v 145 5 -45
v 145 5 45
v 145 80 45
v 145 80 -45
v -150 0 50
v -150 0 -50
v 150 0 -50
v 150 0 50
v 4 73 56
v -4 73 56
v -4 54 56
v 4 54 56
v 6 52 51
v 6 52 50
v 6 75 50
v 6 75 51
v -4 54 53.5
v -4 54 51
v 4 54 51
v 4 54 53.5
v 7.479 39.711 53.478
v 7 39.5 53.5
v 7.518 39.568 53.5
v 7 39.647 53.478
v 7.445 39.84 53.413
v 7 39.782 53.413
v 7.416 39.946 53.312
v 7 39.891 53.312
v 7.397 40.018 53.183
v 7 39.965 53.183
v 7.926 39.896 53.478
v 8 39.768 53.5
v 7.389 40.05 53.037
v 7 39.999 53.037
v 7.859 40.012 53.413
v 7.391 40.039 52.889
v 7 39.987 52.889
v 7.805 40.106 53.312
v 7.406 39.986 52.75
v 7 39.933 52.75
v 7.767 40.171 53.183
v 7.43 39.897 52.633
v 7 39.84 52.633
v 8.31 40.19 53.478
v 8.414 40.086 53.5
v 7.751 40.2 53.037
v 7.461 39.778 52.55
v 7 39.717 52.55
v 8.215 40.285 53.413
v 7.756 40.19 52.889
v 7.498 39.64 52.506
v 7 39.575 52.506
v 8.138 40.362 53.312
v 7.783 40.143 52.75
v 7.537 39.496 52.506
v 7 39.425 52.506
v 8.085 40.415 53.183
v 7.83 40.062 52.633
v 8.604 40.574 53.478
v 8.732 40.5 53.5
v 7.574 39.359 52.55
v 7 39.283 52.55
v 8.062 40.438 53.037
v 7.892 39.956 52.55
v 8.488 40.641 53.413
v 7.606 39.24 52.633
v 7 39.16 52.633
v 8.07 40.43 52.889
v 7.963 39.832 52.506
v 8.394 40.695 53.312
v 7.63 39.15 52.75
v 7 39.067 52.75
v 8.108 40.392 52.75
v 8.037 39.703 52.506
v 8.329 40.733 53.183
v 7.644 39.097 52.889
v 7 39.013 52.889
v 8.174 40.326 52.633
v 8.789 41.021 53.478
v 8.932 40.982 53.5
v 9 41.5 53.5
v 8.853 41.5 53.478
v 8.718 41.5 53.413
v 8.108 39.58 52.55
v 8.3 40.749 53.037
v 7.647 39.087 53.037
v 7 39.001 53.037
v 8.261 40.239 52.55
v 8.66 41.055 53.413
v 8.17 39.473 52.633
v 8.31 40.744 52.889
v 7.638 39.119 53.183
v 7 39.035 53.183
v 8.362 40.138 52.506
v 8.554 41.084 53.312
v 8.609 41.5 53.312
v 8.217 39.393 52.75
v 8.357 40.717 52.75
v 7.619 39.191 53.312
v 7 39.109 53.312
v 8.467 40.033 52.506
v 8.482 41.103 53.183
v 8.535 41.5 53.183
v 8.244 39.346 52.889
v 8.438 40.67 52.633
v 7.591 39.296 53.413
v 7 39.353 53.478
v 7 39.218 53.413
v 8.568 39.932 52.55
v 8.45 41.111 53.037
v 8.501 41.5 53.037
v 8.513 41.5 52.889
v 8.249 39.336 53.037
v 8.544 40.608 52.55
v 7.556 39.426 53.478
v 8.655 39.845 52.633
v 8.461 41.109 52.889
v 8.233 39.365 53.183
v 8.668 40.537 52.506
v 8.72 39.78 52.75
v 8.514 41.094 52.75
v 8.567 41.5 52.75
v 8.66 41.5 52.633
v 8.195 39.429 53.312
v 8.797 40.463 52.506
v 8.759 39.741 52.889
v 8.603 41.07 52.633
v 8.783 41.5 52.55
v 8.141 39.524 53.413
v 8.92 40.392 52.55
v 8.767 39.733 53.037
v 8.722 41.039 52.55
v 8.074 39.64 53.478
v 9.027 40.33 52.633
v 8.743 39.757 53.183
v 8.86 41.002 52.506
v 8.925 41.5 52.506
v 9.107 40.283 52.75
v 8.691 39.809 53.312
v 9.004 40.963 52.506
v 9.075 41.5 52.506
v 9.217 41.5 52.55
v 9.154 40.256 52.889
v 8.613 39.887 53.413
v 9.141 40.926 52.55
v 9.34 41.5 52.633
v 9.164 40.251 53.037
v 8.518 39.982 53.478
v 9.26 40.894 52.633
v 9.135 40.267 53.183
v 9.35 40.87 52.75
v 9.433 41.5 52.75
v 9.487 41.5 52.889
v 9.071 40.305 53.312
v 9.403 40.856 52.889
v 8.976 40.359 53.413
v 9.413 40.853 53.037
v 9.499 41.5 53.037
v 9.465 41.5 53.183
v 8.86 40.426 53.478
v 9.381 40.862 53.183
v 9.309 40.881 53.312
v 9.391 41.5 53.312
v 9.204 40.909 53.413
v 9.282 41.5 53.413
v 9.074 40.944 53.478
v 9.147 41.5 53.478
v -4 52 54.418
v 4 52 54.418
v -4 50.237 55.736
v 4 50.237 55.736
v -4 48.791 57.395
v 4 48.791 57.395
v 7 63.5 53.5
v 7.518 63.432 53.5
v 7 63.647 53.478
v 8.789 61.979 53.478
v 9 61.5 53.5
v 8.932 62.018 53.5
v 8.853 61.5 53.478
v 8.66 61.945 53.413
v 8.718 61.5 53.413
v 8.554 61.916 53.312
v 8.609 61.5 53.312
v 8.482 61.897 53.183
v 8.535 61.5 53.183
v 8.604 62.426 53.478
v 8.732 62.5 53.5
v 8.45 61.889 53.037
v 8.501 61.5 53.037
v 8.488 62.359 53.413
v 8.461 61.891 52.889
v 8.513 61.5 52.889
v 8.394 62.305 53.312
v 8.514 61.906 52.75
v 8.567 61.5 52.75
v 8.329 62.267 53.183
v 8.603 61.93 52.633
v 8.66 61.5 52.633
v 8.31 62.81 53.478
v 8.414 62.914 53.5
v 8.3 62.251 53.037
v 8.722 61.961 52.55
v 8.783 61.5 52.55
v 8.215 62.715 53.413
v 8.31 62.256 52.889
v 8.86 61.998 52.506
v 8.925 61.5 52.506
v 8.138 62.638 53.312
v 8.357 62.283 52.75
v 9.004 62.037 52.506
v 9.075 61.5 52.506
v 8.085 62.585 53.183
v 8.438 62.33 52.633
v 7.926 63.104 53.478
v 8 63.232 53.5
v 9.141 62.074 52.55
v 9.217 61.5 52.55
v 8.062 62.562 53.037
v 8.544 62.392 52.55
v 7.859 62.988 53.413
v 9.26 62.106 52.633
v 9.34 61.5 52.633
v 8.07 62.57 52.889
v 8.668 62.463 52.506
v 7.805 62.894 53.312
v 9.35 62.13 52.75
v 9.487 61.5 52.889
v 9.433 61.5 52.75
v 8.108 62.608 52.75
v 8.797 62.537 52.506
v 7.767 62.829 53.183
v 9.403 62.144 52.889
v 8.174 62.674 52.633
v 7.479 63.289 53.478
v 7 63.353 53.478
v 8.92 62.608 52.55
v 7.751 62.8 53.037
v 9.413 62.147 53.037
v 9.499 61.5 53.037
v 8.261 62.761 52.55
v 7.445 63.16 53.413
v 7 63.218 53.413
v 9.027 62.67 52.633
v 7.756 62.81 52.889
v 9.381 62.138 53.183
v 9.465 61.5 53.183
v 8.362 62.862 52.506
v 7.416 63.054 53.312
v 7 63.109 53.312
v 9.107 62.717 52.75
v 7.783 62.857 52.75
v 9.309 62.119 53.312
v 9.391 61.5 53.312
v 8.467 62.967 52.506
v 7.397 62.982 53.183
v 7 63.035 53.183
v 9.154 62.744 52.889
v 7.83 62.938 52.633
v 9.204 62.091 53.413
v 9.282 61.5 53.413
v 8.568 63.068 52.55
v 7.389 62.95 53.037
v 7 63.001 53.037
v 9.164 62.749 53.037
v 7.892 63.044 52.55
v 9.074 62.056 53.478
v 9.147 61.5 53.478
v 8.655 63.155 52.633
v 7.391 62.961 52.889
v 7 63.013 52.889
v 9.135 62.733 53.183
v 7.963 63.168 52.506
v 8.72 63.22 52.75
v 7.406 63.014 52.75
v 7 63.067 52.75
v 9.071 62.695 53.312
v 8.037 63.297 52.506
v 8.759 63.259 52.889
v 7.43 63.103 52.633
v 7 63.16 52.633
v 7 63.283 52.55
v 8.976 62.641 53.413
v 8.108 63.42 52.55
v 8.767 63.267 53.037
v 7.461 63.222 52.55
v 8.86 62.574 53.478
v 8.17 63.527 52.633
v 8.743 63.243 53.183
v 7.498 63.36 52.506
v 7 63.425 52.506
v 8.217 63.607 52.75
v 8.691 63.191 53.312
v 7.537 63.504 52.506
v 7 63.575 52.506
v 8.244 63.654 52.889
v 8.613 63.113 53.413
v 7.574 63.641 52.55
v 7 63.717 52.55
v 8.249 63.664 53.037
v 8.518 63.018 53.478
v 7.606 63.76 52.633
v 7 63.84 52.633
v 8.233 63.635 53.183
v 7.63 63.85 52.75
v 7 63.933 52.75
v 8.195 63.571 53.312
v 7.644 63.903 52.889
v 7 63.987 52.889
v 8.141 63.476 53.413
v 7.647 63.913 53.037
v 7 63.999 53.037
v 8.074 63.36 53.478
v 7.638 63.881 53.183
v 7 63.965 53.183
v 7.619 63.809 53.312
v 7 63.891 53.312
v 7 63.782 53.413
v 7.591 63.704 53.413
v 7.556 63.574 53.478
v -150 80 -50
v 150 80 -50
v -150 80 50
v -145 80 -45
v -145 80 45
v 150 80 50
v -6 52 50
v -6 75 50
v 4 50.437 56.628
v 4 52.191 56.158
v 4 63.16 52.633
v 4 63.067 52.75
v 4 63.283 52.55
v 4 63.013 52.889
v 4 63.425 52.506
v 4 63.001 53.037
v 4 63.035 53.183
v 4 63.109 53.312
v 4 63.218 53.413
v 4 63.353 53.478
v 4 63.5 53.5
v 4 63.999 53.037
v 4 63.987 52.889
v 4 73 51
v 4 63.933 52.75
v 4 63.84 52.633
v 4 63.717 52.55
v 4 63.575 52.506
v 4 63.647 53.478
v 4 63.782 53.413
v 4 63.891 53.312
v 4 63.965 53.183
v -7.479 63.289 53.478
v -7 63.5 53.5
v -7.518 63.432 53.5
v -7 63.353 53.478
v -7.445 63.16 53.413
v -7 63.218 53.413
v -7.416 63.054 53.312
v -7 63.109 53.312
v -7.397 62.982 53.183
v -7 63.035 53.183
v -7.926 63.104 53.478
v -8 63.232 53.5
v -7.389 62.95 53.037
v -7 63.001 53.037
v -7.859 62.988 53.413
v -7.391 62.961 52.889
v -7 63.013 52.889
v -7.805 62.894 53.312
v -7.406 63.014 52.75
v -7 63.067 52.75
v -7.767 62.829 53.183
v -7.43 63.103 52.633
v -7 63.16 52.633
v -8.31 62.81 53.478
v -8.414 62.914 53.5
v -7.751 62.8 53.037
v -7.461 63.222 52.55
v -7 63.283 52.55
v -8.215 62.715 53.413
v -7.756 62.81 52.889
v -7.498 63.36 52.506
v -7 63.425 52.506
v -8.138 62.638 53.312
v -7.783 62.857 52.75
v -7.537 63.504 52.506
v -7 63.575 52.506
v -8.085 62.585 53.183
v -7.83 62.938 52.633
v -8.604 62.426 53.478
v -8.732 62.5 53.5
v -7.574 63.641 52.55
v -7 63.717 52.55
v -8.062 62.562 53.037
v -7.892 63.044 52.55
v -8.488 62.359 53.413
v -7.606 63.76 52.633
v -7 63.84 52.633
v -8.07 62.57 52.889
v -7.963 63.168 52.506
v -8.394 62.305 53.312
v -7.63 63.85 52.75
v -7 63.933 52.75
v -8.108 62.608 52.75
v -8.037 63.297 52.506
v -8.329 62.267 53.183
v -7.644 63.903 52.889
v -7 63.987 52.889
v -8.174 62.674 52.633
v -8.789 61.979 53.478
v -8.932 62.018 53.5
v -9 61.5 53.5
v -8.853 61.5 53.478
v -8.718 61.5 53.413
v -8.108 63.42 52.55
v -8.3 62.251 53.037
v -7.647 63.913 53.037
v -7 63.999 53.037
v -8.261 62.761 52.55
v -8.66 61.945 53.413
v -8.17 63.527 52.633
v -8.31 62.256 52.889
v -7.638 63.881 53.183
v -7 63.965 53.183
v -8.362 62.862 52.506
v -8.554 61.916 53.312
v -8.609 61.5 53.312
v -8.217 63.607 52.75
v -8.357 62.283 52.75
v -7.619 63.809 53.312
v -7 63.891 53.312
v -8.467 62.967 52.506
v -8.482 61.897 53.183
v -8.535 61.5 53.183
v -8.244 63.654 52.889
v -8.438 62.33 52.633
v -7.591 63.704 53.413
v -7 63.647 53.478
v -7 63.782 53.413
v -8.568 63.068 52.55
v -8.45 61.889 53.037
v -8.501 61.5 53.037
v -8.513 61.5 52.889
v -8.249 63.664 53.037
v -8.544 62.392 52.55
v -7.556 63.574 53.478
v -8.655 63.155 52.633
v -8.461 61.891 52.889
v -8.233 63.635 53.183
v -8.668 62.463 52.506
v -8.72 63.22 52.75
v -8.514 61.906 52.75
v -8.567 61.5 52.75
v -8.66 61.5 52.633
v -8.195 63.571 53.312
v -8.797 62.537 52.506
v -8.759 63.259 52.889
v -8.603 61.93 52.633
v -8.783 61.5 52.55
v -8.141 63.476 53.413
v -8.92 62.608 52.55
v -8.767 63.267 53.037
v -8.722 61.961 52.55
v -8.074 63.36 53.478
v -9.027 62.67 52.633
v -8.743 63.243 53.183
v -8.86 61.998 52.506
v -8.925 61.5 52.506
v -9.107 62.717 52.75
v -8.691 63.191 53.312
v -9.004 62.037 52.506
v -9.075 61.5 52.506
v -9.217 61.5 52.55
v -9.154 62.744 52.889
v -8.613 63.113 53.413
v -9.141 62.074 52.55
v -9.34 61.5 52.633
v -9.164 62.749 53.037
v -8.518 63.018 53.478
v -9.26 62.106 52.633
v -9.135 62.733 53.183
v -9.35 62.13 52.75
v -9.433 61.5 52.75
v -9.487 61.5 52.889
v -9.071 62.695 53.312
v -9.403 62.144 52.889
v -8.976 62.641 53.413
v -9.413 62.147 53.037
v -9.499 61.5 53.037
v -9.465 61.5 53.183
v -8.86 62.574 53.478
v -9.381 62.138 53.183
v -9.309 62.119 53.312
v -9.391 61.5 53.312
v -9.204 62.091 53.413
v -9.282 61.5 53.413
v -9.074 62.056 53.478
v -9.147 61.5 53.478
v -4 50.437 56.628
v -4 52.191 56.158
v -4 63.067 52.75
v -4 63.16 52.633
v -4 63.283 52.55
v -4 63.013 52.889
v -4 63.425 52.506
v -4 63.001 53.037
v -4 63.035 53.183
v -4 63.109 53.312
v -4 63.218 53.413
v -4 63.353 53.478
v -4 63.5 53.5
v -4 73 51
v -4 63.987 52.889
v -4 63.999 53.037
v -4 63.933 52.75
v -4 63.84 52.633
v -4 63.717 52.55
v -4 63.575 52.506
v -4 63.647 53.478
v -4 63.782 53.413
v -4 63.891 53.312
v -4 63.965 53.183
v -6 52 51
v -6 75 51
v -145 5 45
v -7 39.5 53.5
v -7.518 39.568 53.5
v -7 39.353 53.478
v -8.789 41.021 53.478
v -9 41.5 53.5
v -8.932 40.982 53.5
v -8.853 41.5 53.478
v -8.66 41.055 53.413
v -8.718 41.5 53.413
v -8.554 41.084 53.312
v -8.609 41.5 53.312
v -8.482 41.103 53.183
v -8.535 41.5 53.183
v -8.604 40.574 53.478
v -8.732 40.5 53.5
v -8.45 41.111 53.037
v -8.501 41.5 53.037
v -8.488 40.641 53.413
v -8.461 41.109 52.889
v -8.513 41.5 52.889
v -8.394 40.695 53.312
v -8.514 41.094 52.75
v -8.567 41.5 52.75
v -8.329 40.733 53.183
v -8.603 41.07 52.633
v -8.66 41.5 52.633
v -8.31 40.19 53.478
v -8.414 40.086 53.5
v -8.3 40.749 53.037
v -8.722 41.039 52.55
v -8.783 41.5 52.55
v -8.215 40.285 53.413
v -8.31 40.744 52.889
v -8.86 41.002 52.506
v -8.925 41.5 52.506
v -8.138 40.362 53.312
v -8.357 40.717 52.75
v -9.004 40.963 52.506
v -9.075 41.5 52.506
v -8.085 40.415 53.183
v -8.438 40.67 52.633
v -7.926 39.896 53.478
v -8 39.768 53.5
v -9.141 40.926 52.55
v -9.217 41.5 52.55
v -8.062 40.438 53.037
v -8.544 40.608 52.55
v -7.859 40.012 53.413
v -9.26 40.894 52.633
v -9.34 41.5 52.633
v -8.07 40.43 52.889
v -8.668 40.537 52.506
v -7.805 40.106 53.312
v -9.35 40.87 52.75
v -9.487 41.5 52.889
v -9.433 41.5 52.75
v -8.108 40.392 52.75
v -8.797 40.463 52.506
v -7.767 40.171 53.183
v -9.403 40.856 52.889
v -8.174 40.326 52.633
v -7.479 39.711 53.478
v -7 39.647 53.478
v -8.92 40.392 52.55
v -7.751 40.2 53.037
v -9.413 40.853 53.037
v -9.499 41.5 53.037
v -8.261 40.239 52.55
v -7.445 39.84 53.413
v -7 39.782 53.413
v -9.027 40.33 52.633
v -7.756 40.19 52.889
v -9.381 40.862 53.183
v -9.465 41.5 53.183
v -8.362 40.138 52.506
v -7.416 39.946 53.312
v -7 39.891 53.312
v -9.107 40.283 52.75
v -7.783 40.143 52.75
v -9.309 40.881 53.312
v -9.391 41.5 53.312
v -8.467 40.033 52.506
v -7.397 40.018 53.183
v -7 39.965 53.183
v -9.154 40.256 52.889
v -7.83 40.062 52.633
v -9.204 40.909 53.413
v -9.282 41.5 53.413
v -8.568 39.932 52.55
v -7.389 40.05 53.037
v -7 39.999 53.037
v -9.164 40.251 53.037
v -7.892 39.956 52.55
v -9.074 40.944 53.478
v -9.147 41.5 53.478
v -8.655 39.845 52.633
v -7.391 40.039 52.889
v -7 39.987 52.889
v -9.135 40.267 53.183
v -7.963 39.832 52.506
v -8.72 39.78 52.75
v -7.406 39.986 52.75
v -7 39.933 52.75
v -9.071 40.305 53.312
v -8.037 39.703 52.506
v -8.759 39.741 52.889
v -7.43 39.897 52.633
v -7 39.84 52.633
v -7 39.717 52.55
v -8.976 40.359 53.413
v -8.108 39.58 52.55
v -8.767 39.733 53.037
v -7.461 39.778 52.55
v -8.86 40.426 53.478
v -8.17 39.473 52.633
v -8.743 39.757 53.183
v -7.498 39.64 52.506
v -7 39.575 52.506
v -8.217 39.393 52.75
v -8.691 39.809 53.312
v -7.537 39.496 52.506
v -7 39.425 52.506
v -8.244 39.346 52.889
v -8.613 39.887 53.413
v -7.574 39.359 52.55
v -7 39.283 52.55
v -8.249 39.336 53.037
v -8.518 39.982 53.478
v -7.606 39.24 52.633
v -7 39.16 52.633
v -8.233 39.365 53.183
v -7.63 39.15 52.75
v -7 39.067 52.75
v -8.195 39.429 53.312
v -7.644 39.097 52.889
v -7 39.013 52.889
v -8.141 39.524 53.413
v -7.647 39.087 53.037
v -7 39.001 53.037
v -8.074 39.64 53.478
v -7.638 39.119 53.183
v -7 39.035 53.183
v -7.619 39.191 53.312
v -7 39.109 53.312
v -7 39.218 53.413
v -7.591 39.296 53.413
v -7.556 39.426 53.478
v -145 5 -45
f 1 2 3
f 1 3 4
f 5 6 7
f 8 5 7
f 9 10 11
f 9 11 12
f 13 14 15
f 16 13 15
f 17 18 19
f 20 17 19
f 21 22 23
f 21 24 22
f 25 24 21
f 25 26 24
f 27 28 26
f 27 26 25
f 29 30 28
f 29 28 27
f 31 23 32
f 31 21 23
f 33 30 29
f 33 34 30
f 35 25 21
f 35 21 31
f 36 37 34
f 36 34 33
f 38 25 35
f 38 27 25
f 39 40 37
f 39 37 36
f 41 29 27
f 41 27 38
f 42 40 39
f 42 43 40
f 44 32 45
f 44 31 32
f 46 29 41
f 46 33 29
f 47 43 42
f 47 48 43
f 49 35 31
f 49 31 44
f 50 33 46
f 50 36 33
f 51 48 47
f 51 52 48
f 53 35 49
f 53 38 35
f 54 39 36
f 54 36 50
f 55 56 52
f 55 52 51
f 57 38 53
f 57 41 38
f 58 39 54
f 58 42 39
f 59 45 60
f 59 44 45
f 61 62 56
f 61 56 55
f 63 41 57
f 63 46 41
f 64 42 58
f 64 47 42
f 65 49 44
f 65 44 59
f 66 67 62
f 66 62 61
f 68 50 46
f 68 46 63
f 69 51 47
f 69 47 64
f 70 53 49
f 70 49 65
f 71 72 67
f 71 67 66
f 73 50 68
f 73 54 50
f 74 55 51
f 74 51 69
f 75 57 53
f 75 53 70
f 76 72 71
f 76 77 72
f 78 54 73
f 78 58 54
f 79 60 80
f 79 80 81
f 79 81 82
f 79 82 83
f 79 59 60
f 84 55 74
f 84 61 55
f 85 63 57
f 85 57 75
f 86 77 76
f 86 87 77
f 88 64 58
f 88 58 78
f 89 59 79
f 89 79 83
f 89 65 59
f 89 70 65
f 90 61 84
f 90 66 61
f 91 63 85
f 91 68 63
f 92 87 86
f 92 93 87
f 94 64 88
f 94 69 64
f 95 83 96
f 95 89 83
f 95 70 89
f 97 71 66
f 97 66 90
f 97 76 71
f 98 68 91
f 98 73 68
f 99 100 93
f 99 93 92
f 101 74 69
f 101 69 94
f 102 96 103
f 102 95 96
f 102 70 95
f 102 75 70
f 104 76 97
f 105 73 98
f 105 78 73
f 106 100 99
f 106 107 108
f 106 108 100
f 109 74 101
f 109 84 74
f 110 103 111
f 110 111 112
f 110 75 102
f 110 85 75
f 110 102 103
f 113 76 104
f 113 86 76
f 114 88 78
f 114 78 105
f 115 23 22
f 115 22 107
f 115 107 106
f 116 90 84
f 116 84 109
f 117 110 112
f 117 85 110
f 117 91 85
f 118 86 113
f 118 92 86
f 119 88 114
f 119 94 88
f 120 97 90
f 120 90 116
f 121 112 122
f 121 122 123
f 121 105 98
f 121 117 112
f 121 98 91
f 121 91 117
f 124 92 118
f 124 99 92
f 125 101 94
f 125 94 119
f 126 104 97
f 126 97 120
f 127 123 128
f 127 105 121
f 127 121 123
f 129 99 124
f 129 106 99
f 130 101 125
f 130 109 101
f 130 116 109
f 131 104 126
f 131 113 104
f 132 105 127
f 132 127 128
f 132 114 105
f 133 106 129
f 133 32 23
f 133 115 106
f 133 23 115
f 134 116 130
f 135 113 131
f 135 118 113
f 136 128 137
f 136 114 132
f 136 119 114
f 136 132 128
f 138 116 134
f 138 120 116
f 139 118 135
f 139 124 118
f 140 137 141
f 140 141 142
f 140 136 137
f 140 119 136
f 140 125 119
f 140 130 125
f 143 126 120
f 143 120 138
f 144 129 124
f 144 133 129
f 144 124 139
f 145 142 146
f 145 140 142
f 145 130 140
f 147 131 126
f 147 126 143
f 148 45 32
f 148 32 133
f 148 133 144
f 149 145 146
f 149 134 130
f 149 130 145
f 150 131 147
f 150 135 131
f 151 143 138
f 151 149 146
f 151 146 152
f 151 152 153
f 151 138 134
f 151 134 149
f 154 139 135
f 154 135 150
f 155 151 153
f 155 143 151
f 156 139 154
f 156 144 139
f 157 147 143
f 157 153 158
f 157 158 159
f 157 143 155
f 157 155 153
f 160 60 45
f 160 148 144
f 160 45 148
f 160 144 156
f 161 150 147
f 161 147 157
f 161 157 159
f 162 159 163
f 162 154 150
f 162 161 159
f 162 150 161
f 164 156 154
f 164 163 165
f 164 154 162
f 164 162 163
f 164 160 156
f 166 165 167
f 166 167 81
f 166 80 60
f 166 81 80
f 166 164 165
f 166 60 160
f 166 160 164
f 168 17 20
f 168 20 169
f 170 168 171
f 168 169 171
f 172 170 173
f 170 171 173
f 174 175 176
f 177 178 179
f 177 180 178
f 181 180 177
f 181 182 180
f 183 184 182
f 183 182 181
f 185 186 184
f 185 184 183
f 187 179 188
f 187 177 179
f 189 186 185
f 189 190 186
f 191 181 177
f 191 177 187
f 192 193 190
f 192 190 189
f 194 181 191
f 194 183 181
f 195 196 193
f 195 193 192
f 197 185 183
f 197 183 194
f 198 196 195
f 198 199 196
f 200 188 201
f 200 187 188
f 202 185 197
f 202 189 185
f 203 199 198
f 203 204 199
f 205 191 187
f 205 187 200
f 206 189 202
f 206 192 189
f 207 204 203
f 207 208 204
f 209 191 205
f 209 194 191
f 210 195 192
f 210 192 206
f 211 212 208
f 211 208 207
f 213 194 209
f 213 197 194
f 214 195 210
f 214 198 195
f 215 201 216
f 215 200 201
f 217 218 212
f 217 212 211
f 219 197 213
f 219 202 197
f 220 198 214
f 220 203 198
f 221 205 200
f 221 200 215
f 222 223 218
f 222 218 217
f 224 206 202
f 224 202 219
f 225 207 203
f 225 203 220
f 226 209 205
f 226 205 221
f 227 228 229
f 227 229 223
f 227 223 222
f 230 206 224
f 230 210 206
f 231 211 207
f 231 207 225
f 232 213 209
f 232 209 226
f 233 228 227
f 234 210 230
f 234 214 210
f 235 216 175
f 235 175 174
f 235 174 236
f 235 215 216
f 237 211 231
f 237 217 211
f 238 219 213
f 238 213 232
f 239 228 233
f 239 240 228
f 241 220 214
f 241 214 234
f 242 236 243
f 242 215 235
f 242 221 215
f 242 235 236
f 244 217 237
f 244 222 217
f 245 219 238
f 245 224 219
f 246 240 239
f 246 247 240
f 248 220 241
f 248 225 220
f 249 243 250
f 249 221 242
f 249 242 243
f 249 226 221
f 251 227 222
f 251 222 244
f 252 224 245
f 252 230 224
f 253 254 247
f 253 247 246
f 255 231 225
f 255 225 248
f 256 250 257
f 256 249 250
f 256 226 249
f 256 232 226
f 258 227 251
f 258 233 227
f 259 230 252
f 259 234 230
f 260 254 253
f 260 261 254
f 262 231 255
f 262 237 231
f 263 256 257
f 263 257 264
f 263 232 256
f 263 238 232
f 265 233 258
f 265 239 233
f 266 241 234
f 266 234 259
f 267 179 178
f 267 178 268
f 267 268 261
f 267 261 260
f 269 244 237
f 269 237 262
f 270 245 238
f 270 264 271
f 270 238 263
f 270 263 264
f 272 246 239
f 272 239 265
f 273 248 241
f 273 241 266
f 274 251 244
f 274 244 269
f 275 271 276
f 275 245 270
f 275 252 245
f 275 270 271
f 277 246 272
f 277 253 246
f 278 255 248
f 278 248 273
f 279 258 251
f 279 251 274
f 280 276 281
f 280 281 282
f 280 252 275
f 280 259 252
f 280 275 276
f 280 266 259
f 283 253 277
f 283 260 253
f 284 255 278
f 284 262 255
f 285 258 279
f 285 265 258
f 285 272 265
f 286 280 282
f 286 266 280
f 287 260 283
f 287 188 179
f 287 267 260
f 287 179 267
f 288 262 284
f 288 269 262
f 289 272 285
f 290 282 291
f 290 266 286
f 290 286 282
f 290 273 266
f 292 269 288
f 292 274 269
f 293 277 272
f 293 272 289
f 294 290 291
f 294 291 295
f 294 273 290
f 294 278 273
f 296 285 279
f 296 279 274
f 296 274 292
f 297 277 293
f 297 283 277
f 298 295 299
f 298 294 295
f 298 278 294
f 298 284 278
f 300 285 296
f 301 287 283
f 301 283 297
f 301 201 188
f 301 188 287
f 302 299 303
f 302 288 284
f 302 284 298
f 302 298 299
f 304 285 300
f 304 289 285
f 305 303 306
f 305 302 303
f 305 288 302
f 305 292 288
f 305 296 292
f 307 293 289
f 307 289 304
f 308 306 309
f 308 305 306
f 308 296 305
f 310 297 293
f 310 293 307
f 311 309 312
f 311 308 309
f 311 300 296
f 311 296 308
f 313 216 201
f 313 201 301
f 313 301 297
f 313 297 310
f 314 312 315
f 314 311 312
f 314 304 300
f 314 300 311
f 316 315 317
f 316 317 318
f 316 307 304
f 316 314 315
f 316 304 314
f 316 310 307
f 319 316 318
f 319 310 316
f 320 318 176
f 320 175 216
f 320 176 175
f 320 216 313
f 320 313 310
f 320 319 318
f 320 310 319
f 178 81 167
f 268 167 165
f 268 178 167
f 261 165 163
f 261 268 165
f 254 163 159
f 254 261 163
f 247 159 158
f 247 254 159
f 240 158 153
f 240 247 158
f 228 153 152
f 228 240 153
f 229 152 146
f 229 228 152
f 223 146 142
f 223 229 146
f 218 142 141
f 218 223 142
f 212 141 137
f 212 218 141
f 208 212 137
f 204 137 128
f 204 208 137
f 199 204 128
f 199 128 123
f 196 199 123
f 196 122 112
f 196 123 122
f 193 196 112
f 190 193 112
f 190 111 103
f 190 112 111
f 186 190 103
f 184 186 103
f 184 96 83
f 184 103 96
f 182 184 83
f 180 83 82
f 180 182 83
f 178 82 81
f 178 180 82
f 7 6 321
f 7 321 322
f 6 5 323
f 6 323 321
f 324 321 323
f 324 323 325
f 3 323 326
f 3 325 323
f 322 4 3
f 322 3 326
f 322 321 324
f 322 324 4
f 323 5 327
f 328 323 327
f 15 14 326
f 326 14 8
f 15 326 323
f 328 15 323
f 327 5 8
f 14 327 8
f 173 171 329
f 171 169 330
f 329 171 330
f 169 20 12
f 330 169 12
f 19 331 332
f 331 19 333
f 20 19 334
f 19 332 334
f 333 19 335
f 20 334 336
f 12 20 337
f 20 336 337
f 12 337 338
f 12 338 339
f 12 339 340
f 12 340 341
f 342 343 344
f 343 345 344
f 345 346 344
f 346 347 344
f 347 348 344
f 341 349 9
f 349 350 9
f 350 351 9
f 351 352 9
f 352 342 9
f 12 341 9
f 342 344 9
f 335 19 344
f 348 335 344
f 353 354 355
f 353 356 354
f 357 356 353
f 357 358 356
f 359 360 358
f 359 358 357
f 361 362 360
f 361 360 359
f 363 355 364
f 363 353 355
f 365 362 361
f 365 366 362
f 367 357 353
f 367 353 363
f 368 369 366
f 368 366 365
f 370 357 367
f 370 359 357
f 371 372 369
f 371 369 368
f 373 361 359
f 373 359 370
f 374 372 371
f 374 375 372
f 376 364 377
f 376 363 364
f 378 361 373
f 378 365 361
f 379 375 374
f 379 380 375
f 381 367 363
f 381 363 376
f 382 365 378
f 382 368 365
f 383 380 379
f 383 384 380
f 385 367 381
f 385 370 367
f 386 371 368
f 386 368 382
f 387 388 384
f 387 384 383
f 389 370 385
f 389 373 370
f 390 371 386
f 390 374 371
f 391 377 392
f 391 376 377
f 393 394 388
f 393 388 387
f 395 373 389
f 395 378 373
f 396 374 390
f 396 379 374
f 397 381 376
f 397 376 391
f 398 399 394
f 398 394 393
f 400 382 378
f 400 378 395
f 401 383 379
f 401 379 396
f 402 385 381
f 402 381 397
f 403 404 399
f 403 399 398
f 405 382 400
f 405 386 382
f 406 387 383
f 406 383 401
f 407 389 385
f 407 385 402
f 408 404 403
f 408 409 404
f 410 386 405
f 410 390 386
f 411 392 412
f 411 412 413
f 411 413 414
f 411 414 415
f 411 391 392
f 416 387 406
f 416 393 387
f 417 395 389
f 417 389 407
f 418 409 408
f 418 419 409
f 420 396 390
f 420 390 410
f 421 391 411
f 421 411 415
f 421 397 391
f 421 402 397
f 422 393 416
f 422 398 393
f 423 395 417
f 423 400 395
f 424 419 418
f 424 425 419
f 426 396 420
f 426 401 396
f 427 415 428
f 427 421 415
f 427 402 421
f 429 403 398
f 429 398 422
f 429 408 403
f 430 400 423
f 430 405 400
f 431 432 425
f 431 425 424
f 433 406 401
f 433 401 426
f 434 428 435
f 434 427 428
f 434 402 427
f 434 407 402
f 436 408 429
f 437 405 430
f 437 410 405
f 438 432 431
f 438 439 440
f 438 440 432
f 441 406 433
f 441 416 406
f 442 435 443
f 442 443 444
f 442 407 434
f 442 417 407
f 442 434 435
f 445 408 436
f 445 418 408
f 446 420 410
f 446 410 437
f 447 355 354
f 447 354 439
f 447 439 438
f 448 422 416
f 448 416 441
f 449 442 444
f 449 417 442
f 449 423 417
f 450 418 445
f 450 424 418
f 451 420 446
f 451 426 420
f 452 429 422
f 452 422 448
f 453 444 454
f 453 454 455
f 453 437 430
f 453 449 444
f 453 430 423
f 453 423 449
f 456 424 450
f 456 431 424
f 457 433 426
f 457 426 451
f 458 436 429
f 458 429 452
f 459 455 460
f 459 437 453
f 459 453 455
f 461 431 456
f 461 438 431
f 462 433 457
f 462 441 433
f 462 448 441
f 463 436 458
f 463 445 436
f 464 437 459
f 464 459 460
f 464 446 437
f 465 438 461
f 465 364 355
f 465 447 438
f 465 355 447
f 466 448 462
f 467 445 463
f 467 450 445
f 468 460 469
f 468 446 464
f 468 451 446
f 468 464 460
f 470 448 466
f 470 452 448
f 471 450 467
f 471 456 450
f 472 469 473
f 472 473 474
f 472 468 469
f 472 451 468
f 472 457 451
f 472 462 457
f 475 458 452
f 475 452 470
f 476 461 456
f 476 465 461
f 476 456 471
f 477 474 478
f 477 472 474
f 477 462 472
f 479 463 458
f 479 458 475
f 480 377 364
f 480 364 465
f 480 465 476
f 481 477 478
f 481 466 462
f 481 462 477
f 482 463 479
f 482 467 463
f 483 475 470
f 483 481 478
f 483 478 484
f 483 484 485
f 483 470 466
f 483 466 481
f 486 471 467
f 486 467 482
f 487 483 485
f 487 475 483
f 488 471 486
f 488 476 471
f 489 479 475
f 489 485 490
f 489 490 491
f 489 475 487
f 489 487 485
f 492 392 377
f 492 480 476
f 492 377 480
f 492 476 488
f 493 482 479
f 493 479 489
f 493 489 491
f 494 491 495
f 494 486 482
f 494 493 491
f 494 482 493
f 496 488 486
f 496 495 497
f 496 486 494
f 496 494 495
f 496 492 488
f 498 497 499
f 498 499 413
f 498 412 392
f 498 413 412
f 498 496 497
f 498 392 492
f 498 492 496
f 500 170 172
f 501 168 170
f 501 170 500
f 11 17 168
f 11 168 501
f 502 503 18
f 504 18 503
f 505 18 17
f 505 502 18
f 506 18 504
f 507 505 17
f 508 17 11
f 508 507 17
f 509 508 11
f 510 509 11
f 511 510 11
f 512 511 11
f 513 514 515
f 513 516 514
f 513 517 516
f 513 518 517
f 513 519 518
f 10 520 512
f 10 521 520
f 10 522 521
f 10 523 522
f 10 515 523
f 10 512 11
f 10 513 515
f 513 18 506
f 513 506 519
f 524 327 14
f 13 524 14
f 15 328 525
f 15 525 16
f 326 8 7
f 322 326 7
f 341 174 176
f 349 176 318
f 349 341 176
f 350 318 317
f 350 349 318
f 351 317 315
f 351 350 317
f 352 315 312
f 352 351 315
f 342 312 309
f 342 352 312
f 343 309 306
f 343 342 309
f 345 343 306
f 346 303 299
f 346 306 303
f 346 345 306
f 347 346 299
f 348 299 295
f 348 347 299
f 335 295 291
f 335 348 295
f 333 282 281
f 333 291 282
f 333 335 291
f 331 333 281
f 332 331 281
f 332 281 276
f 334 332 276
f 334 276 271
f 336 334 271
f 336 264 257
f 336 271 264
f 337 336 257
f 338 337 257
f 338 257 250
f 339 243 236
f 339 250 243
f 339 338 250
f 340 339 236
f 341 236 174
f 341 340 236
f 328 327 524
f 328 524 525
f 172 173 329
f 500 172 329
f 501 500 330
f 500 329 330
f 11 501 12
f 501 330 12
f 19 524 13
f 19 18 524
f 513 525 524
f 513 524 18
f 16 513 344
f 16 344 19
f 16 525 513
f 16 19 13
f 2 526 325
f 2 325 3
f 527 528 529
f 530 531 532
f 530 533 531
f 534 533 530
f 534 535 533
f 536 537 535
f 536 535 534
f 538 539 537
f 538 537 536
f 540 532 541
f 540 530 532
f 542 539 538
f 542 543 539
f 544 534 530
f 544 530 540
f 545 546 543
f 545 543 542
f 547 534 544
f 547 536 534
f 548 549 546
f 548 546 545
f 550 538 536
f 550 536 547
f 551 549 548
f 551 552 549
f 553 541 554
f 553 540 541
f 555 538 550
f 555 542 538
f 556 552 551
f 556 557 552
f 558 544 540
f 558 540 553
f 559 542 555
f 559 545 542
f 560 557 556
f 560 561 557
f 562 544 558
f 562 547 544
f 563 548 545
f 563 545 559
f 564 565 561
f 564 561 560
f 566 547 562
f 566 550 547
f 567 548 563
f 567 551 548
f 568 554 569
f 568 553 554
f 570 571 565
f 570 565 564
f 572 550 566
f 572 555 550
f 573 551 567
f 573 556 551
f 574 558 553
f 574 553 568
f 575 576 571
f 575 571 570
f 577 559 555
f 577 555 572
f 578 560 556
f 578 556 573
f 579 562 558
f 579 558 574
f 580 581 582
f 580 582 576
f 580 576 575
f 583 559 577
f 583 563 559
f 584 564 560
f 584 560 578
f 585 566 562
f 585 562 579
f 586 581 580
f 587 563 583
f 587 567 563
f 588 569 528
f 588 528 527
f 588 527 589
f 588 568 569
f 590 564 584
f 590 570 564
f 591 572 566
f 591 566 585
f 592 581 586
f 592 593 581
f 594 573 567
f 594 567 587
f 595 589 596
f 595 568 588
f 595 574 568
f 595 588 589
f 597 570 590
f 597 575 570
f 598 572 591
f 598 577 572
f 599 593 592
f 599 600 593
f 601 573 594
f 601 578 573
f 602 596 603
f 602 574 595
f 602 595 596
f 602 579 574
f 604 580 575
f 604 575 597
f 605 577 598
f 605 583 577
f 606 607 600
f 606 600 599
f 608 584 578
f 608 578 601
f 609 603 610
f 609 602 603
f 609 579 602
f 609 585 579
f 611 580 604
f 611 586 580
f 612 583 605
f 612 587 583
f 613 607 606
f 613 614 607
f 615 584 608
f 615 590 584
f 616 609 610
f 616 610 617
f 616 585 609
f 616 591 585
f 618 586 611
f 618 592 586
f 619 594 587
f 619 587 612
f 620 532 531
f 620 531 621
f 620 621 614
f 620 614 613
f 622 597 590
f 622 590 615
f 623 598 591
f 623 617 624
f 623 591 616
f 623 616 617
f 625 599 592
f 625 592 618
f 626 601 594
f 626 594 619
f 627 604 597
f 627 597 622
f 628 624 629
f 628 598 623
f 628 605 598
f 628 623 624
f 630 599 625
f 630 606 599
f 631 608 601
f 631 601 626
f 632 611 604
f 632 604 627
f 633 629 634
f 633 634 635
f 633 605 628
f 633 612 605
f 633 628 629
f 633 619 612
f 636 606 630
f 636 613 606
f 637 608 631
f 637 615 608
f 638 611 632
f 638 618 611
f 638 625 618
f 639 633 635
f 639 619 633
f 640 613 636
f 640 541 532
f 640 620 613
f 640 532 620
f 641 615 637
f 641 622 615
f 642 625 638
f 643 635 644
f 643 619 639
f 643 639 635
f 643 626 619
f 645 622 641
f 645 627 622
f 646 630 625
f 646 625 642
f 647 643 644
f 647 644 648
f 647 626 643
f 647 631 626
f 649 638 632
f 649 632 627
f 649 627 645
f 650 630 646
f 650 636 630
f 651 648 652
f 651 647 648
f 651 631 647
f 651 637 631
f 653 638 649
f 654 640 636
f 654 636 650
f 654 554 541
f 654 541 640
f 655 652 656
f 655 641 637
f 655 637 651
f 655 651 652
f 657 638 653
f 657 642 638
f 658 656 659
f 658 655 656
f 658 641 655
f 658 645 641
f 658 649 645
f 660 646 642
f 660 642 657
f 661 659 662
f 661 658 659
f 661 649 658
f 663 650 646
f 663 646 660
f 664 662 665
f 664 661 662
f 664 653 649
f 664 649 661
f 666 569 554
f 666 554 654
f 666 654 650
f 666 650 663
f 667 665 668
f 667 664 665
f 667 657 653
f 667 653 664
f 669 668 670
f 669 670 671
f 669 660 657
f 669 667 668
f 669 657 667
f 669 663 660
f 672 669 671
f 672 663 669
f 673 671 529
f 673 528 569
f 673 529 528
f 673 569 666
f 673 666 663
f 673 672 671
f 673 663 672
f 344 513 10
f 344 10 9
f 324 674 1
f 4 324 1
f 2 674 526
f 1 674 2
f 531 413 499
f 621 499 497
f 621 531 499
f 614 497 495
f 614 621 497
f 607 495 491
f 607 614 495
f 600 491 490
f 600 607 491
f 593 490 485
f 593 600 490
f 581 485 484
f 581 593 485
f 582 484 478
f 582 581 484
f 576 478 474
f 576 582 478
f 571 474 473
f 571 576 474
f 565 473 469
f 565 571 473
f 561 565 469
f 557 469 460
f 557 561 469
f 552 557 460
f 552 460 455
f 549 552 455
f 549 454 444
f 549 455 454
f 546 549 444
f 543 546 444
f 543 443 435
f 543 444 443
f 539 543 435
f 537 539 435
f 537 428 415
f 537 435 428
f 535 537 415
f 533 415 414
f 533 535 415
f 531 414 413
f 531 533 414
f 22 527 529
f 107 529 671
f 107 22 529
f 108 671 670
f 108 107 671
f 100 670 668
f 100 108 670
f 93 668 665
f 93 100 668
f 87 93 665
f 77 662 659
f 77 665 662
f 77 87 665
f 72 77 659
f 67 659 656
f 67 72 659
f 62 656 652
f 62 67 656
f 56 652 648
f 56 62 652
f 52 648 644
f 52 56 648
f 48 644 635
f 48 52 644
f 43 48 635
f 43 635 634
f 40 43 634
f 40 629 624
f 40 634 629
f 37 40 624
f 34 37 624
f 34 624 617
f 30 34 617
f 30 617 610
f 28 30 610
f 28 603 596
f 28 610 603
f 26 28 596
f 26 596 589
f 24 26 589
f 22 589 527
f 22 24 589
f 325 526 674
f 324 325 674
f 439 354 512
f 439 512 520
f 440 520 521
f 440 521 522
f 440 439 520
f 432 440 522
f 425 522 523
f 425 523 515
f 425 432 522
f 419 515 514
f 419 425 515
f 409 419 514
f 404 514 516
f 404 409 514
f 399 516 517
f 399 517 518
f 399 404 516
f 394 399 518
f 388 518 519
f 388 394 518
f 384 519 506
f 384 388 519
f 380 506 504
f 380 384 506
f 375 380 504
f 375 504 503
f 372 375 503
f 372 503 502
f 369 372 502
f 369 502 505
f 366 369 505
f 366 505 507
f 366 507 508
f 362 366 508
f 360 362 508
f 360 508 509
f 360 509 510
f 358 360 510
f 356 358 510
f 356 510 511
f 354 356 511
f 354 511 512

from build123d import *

# Parameters (mm, degrees)
SKETCH1_W           = 300
SKETCH1_H           = 100
BOSS_EXTRUDE1_DEPTH = 80
SHELL1_T            = -5
SKETCH2_W           = 12
SKETCH2_H           = 23
BOSS_EXTRUDE2_DEPTH = 1
SKETCH3_W           = 8
SKETCH3_H           = 19
BOSS_EXTRUDE3_DEPTH = 5
BOSS_EXTRUDE4_DEPTH = 8
SKETCH6_R           = 0.5


with BuildPart() as part:
    # Sketch1 → Boss-Extrude1 (new body)
    with BuildSketch(Plane(origin=(0, 0, 0), x_dir=(1, 0, 0), z_dir=(0, 1, 0))):
        Rectangle(SKETCH1_W, SKETCH1_H)
    extrude(amount=BOSS_EXTRUDE1_DEPTH)

    # Shell1
    shell1_openings = [part.faces().sort_by_distance(p)[0] for p in [
        (0, 80, 0),
    ]]
    offset(amount=SHELL1_T, openings=shell1_openings, kind=Kind.INTERSECTION)

    # Sketch2 → Boss-Extrude2 (add)
    with BuildSketch(Plane.XY.offset(50)):
        with Locations((0, 63.5)):
            Rectangle(SKETCH2_W, SKETCH2_H)
    extrude(amount=BOSS_EXTRUDE2_DEPTH)

    # Sketch3 → Boss-Extrude3 (add)
    with BuildSketch(Plane.XY.offset(51)):
        with Locations((0, 63.5)):
            Rectangle(SKETCH3_W, SKETCH3_H)
    extrude(amount=BOSS_EXTRUDE3_DEPTH)

    # Sketch4 → Boss-Extrude4 (add)
    with BuildSketch(Plane(origin=(4, 0, 0), x_dir=(0, 0, -1), z_dir=(1, 0, 0))):
        with BuildLine():
            Line((-56, 54), (-53.5, 54))
            ThreePointArc((-53.5, 54), (-55.03079013, 51.083775539), (-57.395060139, 48.790762051))
            ThreePointArc((-57.395060139, 48.790762051), (-56.354803681, 51.303597174), (-56, 54))
        make_face()
    extrude(amount=-BOSS_EXTRUDE4_DEPTH)

    # Sweep1: sweep along a path in Sketch5
    with BuildLine(Plane.XY.offset(53)) as sweep1_path:
        Line((-4, 63.5), (-7, 63.5))
        ThreePointArc((-7, 63.5), (-8.414213562, 62.914213562), (-9, 61.5))
        Line((-9, 61.5), (-9, 41.5))
        ThreePointArc((-9, 41.5), (-8.414213562, 40.085786438), (-7, 39.5))
        Line((-7, 39.5), (7, 39.5))
        ThreePointArc((7, 39.5), (8.414213562, 40.085786438), (9, 41.5))
        Line((9, 41.5), (9, 61.5))
        ThreePointArc((9, 61.5), (8.414213562, 62.914213562), (7, 63.5))
        Line((7, 63.5), (4, 63.5))
    # Sketch6 → Sweep1 (sweep)
    with BuildSketch(Plane.ZY.offset(4)):
        with Locations((53, 63.5)):
            Circle(SKETCH6_R)
    sweep(path=sweep1_path.line)


solid = part.part
